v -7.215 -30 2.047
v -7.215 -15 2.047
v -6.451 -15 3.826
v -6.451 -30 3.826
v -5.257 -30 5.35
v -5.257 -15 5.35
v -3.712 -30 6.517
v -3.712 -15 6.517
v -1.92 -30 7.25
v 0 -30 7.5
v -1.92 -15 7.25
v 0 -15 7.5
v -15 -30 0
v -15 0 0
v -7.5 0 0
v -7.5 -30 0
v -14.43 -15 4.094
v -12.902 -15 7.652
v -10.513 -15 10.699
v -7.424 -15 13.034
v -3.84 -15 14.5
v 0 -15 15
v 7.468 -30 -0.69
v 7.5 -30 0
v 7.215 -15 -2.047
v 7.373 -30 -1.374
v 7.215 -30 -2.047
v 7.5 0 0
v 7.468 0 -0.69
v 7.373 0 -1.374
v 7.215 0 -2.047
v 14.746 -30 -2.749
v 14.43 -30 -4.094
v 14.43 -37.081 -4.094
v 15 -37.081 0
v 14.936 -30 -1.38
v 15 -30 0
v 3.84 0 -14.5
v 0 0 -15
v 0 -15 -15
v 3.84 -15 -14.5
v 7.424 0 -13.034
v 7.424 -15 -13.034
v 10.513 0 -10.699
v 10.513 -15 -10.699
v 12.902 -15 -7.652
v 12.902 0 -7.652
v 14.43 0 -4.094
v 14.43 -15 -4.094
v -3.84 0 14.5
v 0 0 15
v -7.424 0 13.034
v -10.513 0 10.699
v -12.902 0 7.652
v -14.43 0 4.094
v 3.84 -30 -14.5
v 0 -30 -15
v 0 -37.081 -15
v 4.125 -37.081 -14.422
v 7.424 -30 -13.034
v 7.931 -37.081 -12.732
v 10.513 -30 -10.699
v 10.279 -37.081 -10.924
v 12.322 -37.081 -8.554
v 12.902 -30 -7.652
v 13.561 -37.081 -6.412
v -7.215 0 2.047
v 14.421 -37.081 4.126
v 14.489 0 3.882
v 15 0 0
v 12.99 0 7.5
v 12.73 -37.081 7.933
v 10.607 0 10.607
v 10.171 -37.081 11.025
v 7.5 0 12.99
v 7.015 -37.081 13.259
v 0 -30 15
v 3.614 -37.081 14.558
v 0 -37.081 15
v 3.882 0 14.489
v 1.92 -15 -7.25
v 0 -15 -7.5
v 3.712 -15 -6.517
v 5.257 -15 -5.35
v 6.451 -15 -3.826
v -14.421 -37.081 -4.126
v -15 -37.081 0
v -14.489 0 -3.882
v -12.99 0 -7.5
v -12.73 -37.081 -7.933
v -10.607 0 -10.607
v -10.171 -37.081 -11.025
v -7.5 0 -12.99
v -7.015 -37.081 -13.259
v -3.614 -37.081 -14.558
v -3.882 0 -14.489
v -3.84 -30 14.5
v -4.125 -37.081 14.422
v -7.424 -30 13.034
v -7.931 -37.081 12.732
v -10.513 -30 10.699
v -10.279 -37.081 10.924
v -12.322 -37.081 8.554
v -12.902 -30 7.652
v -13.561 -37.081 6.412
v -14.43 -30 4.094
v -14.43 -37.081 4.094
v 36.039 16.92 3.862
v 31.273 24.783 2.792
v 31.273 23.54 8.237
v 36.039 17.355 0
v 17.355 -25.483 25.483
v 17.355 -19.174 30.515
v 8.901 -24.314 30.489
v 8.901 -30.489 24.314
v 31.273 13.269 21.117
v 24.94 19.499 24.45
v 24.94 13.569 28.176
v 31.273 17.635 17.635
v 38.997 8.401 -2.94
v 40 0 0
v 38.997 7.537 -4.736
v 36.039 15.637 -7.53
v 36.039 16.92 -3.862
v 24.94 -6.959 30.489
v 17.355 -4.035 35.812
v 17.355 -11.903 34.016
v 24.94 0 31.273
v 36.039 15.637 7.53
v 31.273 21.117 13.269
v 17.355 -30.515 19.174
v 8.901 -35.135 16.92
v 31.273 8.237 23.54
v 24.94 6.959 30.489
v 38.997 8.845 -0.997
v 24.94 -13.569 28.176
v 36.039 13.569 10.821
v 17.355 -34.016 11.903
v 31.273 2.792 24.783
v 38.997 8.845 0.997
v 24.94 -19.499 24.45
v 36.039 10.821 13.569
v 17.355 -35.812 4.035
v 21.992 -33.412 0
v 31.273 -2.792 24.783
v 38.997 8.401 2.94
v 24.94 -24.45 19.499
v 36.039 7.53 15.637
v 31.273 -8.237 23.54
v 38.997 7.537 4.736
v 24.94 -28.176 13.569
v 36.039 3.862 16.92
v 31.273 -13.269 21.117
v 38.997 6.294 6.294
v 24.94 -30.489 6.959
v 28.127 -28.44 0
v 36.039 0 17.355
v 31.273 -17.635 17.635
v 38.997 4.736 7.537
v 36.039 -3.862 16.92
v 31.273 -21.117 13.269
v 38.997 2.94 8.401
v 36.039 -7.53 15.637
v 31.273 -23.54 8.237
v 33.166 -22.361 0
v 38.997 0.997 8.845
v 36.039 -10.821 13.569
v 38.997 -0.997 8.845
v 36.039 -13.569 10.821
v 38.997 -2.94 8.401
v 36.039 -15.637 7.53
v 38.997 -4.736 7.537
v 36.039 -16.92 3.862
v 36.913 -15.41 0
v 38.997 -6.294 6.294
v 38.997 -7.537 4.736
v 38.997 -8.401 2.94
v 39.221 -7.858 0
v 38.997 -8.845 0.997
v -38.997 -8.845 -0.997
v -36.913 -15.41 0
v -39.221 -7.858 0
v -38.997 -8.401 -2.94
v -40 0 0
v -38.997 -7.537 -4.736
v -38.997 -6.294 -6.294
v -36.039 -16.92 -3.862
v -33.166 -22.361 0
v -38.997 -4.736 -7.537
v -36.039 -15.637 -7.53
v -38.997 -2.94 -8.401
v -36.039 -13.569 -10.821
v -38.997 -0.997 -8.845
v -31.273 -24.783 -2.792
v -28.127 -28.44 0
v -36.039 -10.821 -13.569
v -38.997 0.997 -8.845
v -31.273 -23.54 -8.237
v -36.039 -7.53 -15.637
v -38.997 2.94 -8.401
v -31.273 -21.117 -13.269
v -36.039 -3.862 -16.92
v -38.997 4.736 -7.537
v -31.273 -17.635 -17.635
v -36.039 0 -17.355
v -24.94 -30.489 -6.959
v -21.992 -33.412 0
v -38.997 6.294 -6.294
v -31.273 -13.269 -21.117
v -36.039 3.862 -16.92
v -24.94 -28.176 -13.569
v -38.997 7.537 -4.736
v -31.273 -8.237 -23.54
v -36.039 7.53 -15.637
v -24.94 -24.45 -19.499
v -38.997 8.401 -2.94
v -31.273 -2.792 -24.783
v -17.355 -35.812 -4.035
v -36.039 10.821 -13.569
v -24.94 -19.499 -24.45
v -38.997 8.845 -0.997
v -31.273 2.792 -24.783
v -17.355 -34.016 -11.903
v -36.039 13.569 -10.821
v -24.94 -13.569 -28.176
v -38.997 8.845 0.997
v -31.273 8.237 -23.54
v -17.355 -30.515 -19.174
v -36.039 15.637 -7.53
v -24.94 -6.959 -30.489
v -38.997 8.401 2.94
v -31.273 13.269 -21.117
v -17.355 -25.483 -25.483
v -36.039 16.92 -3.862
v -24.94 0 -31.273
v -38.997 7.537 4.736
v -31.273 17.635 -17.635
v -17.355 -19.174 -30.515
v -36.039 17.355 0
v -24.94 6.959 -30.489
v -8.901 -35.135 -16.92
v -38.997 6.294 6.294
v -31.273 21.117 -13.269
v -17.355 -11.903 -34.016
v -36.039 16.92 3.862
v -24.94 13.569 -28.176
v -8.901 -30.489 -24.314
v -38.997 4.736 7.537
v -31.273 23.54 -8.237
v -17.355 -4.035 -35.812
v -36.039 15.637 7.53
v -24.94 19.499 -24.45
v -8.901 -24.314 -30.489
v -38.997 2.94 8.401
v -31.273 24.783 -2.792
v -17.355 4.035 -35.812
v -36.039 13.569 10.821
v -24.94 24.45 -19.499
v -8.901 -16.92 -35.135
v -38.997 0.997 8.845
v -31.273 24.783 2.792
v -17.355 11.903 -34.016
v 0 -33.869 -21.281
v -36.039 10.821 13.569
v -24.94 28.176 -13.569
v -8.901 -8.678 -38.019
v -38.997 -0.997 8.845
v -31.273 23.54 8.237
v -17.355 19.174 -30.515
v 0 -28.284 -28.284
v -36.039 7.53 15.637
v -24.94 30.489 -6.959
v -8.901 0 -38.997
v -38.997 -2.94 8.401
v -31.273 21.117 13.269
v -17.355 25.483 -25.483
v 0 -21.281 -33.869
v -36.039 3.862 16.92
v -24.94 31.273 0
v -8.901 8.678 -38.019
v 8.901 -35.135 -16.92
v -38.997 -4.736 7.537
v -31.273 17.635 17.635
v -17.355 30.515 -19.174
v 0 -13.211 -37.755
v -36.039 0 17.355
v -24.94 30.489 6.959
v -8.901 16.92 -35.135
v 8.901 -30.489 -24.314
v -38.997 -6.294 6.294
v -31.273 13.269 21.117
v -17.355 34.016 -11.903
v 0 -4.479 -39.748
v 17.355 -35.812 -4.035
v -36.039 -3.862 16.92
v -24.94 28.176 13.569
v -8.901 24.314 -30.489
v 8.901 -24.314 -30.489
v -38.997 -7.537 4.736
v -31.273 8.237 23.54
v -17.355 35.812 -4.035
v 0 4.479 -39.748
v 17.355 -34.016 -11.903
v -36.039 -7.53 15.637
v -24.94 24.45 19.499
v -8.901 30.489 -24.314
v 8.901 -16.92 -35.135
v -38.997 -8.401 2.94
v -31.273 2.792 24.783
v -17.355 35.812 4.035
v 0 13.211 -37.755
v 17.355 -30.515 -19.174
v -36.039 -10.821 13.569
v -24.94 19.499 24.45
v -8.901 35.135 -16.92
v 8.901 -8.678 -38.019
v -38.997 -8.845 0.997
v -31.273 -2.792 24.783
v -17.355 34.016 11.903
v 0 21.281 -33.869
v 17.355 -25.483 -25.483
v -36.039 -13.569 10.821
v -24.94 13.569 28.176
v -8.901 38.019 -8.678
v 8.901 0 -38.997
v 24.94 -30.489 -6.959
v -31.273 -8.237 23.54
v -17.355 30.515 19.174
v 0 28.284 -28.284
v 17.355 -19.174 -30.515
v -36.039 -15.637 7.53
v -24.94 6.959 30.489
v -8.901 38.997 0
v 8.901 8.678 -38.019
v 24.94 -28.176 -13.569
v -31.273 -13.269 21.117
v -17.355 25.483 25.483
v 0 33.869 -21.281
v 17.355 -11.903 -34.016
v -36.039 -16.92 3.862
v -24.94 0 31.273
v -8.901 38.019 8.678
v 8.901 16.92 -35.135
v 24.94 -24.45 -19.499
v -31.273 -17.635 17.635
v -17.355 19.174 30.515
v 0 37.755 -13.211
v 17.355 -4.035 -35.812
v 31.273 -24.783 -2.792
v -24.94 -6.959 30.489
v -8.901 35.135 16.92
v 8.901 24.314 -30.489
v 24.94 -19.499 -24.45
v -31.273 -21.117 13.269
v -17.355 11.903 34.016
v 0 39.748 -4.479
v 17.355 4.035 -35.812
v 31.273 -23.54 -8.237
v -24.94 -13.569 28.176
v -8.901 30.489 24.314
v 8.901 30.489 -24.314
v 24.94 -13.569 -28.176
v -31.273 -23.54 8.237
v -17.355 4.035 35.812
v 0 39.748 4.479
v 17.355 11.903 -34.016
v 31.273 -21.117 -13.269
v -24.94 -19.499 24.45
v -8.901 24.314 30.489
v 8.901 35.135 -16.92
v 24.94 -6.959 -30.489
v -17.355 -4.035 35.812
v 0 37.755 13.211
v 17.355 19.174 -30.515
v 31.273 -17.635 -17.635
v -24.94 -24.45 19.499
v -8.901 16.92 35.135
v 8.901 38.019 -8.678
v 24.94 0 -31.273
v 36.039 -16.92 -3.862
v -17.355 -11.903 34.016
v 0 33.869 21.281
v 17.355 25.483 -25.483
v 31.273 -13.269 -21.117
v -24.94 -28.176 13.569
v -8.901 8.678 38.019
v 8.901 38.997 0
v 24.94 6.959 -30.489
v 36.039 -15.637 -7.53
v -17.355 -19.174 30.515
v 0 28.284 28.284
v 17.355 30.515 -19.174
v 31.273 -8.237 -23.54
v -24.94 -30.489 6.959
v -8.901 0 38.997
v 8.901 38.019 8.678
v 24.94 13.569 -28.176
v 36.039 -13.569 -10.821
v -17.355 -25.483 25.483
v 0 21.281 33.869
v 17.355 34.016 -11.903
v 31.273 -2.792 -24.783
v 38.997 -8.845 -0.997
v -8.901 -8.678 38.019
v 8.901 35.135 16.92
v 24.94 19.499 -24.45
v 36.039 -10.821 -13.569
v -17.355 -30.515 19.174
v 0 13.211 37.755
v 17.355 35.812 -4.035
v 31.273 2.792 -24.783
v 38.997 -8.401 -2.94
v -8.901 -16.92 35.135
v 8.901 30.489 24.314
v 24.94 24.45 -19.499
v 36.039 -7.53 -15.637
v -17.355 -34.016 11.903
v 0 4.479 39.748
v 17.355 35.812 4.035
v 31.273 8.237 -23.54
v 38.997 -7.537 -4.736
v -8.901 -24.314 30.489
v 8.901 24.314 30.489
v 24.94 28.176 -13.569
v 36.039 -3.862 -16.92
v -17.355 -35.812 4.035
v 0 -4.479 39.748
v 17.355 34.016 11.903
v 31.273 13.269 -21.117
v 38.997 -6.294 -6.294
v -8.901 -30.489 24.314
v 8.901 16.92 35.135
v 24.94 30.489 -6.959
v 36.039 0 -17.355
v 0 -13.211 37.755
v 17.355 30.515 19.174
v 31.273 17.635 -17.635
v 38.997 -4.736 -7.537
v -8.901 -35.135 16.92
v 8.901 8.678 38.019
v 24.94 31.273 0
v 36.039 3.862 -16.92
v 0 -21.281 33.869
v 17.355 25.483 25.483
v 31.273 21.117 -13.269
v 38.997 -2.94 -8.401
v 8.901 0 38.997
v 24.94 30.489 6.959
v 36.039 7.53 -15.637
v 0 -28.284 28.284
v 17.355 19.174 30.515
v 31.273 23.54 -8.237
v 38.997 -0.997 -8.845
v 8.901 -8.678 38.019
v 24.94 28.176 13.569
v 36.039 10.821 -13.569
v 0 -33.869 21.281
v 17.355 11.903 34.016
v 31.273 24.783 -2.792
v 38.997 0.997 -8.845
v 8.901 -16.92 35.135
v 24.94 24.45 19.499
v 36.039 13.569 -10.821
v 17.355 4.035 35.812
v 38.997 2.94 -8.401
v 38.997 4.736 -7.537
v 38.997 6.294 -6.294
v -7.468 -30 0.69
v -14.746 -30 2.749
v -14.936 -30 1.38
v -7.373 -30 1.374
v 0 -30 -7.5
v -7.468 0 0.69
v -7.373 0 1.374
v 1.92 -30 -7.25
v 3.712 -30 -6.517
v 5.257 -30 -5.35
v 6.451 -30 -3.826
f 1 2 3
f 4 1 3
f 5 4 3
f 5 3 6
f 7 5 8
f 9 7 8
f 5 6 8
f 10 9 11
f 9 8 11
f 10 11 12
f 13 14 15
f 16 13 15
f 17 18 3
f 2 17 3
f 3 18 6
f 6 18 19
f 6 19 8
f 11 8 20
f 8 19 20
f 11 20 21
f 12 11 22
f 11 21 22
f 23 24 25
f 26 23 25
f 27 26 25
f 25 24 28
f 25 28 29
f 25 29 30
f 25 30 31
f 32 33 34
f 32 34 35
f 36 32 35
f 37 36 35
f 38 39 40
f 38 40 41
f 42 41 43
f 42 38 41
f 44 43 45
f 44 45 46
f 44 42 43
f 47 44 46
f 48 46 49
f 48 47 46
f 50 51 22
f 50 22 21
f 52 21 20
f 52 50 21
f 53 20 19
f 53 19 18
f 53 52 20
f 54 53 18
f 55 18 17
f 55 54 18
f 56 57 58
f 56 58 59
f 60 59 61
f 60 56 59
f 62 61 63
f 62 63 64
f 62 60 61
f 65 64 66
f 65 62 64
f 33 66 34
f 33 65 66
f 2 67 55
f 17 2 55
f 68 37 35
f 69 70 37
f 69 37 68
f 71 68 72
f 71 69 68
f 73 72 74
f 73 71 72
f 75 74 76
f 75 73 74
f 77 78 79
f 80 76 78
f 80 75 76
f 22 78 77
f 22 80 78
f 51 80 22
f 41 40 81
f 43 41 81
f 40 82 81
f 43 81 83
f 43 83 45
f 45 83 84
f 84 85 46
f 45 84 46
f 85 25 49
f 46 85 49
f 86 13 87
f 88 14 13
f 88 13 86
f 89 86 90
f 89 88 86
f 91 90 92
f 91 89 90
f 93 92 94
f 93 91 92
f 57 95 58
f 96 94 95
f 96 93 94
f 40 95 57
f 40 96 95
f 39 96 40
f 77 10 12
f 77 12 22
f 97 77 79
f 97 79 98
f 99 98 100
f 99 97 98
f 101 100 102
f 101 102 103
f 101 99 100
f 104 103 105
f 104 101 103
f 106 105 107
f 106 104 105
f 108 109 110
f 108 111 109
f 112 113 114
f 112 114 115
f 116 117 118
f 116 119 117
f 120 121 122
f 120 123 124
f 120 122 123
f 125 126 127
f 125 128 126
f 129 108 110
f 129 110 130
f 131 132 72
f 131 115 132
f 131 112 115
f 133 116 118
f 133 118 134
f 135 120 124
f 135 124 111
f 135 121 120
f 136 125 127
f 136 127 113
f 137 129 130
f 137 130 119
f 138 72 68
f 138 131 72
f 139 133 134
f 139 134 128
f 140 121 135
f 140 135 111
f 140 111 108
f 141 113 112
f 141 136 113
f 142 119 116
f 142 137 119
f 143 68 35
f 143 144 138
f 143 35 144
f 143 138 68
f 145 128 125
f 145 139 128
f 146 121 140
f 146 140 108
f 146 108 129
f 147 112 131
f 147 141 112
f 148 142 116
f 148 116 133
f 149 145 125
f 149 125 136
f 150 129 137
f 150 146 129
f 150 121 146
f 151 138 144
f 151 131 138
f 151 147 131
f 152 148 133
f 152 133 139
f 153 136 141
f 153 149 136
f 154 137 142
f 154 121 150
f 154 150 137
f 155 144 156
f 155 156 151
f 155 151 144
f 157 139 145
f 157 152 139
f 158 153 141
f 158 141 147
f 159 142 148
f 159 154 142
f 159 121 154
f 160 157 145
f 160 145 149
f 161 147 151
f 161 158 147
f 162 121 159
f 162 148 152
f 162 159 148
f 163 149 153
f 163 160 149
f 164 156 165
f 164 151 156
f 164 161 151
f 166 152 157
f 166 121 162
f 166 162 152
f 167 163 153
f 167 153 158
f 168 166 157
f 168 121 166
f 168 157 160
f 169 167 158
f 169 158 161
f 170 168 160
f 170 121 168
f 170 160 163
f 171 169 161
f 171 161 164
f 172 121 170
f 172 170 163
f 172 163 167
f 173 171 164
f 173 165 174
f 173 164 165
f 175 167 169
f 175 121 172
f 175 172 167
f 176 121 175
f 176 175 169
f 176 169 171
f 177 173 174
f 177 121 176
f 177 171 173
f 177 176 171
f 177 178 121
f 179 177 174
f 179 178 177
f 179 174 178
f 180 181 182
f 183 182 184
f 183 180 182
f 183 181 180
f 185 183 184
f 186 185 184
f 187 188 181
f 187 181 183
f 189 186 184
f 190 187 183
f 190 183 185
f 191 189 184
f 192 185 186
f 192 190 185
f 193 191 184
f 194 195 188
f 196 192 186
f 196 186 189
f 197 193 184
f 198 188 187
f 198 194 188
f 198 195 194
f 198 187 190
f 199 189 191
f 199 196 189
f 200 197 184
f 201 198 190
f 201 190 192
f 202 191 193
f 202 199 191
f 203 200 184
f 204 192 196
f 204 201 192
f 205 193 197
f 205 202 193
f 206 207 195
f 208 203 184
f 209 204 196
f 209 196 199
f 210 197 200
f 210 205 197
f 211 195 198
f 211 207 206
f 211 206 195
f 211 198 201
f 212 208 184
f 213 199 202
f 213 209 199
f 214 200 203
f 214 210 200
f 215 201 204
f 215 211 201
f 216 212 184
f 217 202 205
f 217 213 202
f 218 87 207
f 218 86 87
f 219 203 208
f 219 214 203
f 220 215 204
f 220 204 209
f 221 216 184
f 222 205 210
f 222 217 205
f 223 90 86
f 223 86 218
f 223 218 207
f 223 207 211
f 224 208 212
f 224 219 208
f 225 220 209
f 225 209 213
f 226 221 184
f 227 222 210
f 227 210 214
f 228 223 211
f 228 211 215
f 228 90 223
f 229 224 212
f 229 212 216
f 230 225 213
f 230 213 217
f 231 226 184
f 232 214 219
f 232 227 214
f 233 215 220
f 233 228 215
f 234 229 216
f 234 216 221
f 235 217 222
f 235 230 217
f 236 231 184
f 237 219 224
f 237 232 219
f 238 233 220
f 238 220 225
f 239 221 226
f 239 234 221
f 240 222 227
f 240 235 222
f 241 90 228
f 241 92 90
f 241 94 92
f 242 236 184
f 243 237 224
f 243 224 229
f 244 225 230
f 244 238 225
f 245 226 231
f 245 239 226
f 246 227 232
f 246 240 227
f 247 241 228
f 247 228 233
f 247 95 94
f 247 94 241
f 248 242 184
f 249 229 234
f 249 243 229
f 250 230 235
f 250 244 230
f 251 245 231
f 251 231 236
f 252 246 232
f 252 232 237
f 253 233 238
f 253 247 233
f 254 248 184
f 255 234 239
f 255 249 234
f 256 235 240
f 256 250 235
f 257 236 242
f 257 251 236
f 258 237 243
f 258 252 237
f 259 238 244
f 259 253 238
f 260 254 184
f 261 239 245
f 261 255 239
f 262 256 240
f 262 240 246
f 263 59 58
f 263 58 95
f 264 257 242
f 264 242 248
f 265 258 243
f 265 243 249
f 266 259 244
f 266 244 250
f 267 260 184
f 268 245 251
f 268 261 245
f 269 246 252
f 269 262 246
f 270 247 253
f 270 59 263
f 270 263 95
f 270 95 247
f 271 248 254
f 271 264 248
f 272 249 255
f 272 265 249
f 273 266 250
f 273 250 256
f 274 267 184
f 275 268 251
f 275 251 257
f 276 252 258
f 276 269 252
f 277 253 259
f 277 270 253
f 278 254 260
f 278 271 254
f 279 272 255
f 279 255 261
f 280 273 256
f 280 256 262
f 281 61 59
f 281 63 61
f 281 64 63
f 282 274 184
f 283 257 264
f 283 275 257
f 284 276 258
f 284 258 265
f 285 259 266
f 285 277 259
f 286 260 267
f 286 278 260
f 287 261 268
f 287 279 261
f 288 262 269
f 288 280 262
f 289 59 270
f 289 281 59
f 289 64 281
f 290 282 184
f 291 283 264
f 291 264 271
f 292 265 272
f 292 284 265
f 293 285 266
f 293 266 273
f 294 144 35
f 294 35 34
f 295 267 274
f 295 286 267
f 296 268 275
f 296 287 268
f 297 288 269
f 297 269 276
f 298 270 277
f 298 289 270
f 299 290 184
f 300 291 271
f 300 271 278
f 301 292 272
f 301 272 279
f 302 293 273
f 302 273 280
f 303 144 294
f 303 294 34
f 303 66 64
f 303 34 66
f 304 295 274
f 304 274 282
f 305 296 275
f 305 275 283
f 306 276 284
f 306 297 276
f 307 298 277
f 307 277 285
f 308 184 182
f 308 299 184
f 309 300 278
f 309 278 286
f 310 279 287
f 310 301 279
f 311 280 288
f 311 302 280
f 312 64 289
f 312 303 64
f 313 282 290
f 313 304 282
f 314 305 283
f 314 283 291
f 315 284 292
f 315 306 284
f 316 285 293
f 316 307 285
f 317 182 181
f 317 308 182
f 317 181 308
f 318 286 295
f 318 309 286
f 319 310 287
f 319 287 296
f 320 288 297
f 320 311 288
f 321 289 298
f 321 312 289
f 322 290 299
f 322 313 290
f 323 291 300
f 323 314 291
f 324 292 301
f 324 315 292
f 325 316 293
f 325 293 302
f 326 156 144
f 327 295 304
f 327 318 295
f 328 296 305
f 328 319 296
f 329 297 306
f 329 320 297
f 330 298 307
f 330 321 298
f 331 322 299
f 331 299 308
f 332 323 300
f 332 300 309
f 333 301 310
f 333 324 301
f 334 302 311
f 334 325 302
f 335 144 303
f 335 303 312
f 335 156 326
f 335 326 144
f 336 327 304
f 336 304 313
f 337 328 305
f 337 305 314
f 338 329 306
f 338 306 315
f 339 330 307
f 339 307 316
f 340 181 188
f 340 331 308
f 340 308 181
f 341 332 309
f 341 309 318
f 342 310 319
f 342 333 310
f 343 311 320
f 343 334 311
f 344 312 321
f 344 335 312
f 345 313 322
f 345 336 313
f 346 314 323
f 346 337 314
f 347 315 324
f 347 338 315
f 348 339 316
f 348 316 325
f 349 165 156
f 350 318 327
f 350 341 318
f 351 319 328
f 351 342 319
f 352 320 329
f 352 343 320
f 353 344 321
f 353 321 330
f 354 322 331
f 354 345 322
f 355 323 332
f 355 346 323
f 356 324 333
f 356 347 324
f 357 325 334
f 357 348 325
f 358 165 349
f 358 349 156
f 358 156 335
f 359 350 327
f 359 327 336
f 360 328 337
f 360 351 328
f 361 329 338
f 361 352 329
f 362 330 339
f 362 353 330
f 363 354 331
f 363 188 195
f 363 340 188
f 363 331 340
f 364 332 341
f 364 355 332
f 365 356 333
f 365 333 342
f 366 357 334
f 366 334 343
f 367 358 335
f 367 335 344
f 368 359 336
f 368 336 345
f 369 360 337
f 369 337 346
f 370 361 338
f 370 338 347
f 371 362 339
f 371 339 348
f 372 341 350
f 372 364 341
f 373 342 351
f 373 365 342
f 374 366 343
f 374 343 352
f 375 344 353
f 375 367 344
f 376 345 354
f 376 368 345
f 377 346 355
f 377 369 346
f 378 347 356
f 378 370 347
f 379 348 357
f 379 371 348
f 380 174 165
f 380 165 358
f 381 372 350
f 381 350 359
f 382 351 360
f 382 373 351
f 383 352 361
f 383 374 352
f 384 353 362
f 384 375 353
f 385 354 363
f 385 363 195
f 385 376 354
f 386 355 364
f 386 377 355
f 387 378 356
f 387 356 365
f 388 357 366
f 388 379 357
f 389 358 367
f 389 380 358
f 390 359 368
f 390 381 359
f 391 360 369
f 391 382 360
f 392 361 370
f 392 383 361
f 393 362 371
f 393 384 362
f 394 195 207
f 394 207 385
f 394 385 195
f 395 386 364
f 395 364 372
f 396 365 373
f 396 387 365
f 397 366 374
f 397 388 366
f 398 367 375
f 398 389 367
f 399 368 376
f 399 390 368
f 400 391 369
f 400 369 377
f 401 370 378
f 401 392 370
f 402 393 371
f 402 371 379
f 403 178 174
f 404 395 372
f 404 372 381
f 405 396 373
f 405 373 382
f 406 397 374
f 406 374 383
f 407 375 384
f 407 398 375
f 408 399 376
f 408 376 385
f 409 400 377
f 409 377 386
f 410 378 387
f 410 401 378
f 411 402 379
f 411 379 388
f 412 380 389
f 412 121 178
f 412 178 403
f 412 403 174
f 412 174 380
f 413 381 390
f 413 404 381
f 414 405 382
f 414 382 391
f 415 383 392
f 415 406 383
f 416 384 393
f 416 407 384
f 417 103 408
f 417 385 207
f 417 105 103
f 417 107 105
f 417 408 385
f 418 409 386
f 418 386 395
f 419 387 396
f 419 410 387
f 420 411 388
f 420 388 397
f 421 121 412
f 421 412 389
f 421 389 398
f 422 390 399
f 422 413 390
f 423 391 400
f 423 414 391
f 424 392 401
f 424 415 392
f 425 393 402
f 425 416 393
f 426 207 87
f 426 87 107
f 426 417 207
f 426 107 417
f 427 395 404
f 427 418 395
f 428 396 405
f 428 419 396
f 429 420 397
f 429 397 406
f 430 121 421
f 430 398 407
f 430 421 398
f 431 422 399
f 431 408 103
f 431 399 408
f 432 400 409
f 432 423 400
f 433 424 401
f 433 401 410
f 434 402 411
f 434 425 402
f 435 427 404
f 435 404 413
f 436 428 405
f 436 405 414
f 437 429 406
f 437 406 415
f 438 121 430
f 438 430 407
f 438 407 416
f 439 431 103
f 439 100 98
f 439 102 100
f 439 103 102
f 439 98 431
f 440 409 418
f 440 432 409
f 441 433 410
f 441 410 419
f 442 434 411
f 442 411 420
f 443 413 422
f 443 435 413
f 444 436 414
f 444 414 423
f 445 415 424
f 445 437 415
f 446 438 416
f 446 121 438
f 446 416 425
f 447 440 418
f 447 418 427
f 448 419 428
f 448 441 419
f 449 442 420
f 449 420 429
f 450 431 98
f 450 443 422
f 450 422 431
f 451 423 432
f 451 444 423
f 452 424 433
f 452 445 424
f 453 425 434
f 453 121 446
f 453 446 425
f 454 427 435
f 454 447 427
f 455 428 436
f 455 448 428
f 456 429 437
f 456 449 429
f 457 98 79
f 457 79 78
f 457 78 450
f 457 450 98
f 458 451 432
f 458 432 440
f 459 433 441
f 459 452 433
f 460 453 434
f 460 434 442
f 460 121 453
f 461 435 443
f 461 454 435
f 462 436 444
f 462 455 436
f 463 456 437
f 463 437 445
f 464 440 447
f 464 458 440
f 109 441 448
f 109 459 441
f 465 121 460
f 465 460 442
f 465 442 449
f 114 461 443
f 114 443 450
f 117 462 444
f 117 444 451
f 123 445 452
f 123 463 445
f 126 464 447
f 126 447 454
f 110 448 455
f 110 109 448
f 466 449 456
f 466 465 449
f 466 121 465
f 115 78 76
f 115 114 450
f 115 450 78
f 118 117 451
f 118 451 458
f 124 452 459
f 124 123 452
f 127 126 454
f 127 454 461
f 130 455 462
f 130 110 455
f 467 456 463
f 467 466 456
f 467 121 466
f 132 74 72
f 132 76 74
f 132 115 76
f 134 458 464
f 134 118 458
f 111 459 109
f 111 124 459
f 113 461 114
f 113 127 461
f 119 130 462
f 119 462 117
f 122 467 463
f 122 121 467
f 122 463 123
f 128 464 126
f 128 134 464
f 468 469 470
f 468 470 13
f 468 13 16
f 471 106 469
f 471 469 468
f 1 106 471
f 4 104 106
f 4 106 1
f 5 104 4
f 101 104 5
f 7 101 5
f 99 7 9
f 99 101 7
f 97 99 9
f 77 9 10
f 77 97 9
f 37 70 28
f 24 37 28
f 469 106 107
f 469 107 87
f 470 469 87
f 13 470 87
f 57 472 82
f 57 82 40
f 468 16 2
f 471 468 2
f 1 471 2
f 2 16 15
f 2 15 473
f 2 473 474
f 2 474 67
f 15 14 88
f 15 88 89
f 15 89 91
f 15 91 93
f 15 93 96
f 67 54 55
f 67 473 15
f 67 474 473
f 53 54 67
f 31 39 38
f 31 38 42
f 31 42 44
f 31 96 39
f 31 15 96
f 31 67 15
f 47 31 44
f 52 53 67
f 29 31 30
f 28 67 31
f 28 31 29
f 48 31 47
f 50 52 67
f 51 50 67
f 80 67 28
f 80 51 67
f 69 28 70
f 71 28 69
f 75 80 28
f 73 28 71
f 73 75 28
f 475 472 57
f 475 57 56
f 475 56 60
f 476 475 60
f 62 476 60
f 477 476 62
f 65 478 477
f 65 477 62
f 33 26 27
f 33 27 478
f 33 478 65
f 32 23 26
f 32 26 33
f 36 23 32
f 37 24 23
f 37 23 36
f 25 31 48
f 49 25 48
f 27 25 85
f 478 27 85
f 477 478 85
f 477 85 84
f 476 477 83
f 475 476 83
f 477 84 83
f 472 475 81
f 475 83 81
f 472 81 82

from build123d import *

# Parameters (mm, degrees)
F3_DEPTH = 100
F4_DEPTH = 30
F5_DEPTH = 15
F6_DEPTH = 30


with BuildPart() as f2:
    # F0 (on Top) → F2 (revolve)
    with BuildSketch(Plane.XY):
        with BuildLine():
            Line((40, 0), (-40, 0))
            ThreePointArc((-40, 0), (0, -40), (40, 0))
        make_face()
    revolve(axis=Axis((0, 0, 0), (1, 0, 0)))

    # F1 (on Front) → F3 (cut)
    with BuildSketch(Plane.XZ):
        with BuildLine():
            Line((7.5, 0), (15, 0))
            ThreePointArc((15, 0), (10.606602, 10.606602), (0, 15))
            Line((0, 15), (0, 7.5))
            ThreePointArc((0, 7.5), (-4.522025, 5.983418), (-7.215244, 2.04701))
            Line((-7.215244, 2.04701), (0, 0))
            Line((0, 0), (7.215244, -2.04701))
            ThreePointArc((7.215244, -2.04701), (7.42847, -1.033361), (7.5, 0))
        make_face()
        with BuildLine():
            ThreePointArc((14.430488, -4.094021), (14.85694, -2.066721), (15, 0))
            Line((15, 0), (7.5, 0))
            ThreePointArc((7.5, 0), (7.42847, -1.033361), (7.215244, -2.04701))
            Line((7.215244, -2.04701), (14.430488, -4.094021))
        make_face()
        with BuildLine():
            Line((0, 7.5), (0, 15))
            ThreePointArc((0, 15), (-9.04405, 11.966836), (-14.430488, 4.094021))
            Line((-14.430488, 4.094021), (-7.215244, 2.04701))
            ThreePointArc((-7.215244, 2.04701), (-4.522025, 5.983418), (0, 7.5))
        make_face()
        with BuildLine():
            ThreePointArc((0, -15), (9.04405, -11.966836), (14.430488, -4.094021))
            Line((14.430488, -4.094021), (7.215244, -2.04701))
            ThreePointArc((7.215244, -2.04701), (4.522025, -5.983418), (0, -7.5))
            Line((0, -7.5), (0, -15))
        make_face()
        with BuildLine():
            Line((-7.215244, 2.04701), (-14.430488, 4.094021))
            ThreePointArc((-14.430488, 4.094021), (-14.85694, 2.066721), (-15, 0))
            Line((-15, 0), (-7.5, 0))
            ThreePointArc((-7.5, 0), (-7.42847, 1.033361), (-7.215244, 2.04701))
        make_face()
        with BuildLine():
            ThreePointArc((-15, 0), (-10.606602, -10.606602), (0, -15))
            Line((0, -15), (0, -7.5))
            ThreePointArc((0, -7.5), (4.522025, -5.983418), (7.215244, -2.04701))
            Line((7.215244, -2.04701), (0, 0))
            Line((0, 0), (-7.215244, 2.04701))
            ThreePointArc((-7.215244, 2.04701), (-7.42847, 1.033361), (-7.5, 0))
            Line((-7.5, 0), (-15, 0))
        make_face()
    extrude(amount=F3_DEPTH, mode=Mode.SUBTRACT)

    # F1 (on Front) → F4 (join)
    with BuildSketch(Plane.XZ):
        with BuildLine():
            Line((0, 7.5), (0, 15))
            ThreePointArc((0, 15), (-9.04405, 11.966836), (-14.430488, 4.094021))
            Line((-14.430488, 4.094021), (-7.215244, 2.04701))
            ThreePointArc((-7.215244, 2.04701), (-4.522025, 5.983418), (0, 7.5))
        make_face()
        with BuildLine():
            ThreePointArc((0, -15), (9.04405, -11.966836), (14.430488, -4.094021))
            Line((14.430488, -4.094021), (7.215244, -2.04701))
            ThreePointArc((7.215244, -2.04701), (4.522025, -5.983418), (0, -7.5))
            Line((0, -7.5), (0, -15))
        make_face()
    extrude(amount=F4_DEPTH)

    # F1 (on Front) → F5 (cut)
    with BuildSketch(Plane.XZ):
        with BuildLine():
            Line((0, 7.5), (0, 15))
            ThreePointArc((0, 15), (-9.04405, 11.966836), (-14.430488, 4.094021))
            Line((-14.430488, 4.094021), (-7.215244, 2.04701))
            ThreePointArc((-7.215244, 2.04701), (-4.522025, 5.983418), (0, 7.5))
        make_face()
        with BuildLine():
            ThreePointArc((0, -15), (9.04405, -11.966836), (14.430488, -4.094021))
            Line((14.430488, -4.094021), (7.215244, -2.04701))
            ThreePointArc((7.215244, -2.04701), (4.522025, -5.983418), (0, -7.5))
            Line((0, -7.5), (0, -15))
        make_face()
    extrude(amount=F5_DEPTH, mode=Mode.SUBTRACT)

    # F1 (on Front) → F6 (join)
    with BuildSketch(Plane.XZ):
        with BuildLine():
            Line((-7.215244, 2.04701), (-14.430488, 4.094021))
            ThreePointArc((-14.430488, 4.094021), (-14.85694, 2.066721), (-15, 0))
            Line((-15, 0), (-7.5, 0))
            ThreePointArc((-7.5, 0), (-7.42847, 1.033361), (-7.215244, 2.04701))
        make_face()
        with BuildLine():
            ThreePointArc((14.430488, -4.094021), (14.85694, -2.066721), (15, 0))
            Line((15, 0), (7.5, 0))
            ThreePointArc((7.5, 0), (7.42847, -1.033361), (7.215244, -2.04701))
            Line((7.215244, -2.04701), (14.430488, -4.094021))
        make_face()
    extrude(amount=F6_DEPTH)


solid = f2.part
